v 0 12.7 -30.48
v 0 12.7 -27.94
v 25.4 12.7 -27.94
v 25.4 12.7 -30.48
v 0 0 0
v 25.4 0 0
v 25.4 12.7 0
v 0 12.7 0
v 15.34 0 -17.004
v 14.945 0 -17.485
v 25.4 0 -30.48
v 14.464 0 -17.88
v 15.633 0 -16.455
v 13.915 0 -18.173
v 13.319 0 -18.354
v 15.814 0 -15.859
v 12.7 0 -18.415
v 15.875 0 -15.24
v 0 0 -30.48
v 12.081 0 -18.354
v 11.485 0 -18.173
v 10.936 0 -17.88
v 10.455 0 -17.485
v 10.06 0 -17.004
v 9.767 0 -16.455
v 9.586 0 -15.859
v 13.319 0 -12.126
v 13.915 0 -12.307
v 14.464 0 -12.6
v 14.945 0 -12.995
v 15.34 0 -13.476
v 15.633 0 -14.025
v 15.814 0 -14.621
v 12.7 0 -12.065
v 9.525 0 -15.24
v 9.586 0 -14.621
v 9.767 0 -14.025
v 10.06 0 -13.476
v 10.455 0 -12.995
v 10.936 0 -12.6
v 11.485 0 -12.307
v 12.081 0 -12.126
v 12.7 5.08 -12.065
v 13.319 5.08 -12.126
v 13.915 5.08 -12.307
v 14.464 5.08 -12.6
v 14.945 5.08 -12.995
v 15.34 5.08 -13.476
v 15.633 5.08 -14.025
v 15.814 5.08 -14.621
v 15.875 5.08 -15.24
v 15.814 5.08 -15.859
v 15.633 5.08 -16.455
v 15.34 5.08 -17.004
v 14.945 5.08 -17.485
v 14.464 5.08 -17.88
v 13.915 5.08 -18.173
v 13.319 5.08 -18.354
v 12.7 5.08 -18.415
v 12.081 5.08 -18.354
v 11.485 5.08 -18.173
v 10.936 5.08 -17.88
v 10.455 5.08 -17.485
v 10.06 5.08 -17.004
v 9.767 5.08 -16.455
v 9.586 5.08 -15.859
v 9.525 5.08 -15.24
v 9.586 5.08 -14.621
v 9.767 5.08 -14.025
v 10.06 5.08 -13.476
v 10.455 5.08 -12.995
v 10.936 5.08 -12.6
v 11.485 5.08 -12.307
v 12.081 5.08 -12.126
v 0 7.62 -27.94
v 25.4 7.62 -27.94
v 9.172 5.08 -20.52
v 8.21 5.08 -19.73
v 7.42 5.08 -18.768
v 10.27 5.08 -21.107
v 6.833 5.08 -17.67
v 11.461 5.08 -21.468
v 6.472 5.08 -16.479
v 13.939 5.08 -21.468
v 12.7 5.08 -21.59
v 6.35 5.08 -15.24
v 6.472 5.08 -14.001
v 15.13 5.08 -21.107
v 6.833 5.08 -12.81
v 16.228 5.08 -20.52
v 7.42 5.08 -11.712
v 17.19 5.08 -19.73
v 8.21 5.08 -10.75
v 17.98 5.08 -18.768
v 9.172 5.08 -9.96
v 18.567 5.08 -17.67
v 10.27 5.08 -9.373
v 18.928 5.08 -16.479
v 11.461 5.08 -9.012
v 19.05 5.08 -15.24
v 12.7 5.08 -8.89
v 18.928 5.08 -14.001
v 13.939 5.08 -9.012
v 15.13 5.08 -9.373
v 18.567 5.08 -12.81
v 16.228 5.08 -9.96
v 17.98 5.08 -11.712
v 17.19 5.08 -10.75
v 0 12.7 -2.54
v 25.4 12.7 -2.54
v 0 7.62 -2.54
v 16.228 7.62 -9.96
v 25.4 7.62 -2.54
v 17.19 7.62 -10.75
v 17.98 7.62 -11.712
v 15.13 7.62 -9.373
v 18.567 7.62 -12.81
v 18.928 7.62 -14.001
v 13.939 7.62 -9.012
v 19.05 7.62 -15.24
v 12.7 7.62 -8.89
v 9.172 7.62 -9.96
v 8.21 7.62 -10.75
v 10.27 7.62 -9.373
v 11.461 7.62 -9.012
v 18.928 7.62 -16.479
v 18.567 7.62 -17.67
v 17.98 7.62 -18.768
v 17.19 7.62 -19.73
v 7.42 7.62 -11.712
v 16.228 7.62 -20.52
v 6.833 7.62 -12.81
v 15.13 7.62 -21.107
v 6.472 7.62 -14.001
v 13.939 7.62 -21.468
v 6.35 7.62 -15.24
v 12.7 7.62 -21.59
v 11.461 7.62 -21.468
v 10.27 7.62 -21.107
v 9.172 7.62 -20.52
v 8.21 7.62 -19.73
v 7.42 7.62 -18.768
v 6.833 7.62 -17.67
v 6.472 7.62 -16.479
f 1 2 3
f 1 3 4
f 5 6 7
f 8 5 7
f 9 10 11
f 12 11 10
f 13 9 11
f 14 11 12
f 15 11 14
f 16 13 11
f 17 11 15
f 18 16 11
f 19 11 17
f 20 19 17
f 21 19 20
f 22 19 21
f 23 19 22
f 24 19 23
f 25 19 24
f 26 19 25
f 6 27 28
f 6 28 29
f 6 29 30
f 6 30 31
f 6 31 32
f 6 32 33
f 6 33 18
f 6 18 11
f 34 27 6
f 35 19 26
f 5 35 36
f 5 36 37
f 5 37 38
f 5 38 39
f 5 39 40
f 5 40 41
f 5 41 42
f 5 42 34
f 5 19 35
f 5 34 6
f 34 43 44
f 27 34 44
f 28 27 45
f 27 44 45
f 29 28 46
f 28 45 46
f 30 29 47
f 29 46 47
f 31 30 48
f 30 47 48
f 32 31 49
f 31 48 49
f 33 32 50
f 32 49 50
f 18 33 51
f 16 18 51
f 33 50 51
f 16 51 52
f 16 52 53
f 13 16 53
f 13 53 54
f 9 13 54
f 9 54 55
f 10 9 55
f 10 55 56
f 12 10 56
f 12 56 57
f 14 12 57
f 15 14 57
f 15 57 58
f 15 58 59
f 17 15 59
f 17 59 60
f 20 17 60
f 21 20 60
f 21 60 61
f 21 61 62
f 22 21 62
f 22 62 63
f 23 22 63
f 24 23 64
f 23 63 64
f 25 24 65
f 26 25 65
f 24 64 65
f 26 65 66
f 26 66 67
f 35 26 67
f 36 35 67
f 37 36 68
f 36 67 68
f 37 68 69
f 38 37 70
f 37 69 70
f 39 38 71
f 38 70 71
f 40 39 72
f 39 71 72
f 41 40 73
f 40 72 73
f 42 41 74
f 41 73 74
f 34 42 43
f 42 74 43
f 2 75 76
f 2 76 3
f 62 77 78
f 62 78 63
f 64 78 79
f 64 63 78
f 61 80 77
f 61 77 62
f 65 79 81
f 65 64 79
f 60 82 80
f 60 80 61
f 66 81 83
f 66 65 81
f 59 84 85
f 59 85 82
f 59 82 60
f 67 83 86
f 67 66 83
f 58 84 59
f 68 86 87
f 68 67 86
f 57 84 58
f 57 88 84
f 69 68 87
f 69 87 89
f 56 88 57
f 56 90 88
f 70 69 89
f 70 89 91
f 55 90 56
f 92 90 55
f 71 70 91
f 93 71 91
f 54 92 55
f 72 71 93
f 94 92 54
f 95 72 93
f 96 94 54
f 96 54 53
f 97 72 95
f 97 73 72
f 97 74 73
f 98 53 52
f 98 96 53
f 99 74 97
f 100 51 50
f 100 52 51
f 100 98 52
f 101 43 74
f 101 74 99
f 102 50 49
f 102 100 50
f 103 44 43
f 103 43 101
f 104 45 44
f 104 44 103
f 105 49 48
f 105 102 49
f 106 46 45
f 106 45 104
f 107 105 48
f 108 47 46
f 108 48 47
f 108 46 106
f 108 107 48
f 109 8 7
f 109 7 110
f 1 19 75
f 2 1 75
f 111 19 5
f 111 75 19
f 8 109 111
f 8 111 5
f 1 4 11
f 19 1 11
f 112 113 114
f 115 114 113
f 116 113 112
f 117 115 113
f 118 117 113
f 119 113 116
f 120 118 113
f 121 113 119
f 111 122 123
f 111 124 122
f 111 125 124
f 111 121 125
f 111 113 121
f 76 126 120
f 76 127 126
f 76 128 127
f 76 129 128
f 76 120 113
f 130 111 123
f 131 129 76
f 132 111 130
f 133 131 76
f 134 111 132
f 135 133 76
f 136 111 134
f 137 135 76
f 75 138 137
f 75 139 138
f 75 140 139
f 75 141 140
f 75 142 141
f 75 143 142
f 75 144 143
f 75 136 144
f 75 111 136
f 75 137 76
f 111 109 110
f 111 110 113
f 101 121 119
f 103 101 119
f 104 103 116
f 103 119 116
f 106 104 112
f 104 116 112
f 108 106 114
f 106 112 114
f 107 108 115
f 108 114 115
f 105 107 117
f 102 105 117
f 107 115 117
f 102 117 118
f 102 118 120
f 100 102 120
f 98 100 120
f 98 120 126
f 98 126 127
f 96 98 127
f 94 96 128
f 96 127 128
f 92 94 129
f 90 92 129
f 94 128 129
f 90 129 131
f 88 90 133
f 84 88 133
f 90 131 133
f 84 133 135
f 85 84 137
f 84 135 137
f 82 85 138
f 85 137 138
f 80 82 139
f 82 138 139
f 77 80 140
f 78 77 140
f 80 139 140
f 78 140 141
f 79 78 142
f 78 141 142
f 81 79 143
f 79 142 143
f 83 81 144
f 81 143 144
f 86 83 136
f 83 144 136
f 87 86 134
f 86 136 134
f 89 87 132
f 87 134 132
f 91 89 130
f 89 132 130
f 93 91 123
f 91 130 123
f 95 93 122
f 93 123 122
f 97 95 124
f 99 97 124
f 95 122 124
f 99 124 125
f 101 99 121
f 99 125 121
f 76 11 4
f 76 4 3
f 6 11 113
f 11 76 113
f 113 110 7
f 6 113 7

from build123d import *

# Parameters (mm, degrees)
BOSS_EXTRUDE1_DEPTH = 25.4
SKETCH2_R           = 3.175
CUT_EXTRUDE1_DEPTH  = 41.40117325
SKETCH3_R           = 6.35
CUT_EXTRUDE2_DEPTH  = 2.54


with BuildPart() as part:
    # Sketch1 → Boss-Extrude1 (new body)
    with BuildSketch(Plane(origin=(0, 0, 0), x_dir=(0, 0, -1), z_dir=(1, 0, 0))):
        Polygon((27.94, 12.7), (30.48, 12.7), (30.48, 0), (0, 0), (0, 12.7), (2.54, 12.7), (2.54, 7.62), (27.94, 7.62), align=None)
    extrude(amount=BOSS_EXTRUDE1_DEPTH)

    # Sketch2 → Cut-Extrude1 (cut, through all)
    with BuildSketch(Plane(origin=(0, 7.62, 0), x_dir=(1, 0, 0), z_dir=(0, 1, 0))):
        with Locations(Location((12.7, 15.24, 0), (0, 0, 270))):
            Circle(SKETCH2_R)
    extrude(amount=-CUT_EXTRUDE1_DEPTH, mode=Mode.SUBTRACT)

    # Sketch3 → Cut-Extrude2 (cut)
    with BuildSketch(Plane(origin=(0, 7.62, 0), x_dir=(1, 0, 0), z_dir=(0, 1, 0))):
        with Locations(Location((12.7, 15.24, 0), (0, 0, 270))):
            Circle(SKETCH3_R)
    extrude(amount=-CUT_EXTRUDE2_DEPTH, mode=Mode.SUBTRACT)


solid = part.part
